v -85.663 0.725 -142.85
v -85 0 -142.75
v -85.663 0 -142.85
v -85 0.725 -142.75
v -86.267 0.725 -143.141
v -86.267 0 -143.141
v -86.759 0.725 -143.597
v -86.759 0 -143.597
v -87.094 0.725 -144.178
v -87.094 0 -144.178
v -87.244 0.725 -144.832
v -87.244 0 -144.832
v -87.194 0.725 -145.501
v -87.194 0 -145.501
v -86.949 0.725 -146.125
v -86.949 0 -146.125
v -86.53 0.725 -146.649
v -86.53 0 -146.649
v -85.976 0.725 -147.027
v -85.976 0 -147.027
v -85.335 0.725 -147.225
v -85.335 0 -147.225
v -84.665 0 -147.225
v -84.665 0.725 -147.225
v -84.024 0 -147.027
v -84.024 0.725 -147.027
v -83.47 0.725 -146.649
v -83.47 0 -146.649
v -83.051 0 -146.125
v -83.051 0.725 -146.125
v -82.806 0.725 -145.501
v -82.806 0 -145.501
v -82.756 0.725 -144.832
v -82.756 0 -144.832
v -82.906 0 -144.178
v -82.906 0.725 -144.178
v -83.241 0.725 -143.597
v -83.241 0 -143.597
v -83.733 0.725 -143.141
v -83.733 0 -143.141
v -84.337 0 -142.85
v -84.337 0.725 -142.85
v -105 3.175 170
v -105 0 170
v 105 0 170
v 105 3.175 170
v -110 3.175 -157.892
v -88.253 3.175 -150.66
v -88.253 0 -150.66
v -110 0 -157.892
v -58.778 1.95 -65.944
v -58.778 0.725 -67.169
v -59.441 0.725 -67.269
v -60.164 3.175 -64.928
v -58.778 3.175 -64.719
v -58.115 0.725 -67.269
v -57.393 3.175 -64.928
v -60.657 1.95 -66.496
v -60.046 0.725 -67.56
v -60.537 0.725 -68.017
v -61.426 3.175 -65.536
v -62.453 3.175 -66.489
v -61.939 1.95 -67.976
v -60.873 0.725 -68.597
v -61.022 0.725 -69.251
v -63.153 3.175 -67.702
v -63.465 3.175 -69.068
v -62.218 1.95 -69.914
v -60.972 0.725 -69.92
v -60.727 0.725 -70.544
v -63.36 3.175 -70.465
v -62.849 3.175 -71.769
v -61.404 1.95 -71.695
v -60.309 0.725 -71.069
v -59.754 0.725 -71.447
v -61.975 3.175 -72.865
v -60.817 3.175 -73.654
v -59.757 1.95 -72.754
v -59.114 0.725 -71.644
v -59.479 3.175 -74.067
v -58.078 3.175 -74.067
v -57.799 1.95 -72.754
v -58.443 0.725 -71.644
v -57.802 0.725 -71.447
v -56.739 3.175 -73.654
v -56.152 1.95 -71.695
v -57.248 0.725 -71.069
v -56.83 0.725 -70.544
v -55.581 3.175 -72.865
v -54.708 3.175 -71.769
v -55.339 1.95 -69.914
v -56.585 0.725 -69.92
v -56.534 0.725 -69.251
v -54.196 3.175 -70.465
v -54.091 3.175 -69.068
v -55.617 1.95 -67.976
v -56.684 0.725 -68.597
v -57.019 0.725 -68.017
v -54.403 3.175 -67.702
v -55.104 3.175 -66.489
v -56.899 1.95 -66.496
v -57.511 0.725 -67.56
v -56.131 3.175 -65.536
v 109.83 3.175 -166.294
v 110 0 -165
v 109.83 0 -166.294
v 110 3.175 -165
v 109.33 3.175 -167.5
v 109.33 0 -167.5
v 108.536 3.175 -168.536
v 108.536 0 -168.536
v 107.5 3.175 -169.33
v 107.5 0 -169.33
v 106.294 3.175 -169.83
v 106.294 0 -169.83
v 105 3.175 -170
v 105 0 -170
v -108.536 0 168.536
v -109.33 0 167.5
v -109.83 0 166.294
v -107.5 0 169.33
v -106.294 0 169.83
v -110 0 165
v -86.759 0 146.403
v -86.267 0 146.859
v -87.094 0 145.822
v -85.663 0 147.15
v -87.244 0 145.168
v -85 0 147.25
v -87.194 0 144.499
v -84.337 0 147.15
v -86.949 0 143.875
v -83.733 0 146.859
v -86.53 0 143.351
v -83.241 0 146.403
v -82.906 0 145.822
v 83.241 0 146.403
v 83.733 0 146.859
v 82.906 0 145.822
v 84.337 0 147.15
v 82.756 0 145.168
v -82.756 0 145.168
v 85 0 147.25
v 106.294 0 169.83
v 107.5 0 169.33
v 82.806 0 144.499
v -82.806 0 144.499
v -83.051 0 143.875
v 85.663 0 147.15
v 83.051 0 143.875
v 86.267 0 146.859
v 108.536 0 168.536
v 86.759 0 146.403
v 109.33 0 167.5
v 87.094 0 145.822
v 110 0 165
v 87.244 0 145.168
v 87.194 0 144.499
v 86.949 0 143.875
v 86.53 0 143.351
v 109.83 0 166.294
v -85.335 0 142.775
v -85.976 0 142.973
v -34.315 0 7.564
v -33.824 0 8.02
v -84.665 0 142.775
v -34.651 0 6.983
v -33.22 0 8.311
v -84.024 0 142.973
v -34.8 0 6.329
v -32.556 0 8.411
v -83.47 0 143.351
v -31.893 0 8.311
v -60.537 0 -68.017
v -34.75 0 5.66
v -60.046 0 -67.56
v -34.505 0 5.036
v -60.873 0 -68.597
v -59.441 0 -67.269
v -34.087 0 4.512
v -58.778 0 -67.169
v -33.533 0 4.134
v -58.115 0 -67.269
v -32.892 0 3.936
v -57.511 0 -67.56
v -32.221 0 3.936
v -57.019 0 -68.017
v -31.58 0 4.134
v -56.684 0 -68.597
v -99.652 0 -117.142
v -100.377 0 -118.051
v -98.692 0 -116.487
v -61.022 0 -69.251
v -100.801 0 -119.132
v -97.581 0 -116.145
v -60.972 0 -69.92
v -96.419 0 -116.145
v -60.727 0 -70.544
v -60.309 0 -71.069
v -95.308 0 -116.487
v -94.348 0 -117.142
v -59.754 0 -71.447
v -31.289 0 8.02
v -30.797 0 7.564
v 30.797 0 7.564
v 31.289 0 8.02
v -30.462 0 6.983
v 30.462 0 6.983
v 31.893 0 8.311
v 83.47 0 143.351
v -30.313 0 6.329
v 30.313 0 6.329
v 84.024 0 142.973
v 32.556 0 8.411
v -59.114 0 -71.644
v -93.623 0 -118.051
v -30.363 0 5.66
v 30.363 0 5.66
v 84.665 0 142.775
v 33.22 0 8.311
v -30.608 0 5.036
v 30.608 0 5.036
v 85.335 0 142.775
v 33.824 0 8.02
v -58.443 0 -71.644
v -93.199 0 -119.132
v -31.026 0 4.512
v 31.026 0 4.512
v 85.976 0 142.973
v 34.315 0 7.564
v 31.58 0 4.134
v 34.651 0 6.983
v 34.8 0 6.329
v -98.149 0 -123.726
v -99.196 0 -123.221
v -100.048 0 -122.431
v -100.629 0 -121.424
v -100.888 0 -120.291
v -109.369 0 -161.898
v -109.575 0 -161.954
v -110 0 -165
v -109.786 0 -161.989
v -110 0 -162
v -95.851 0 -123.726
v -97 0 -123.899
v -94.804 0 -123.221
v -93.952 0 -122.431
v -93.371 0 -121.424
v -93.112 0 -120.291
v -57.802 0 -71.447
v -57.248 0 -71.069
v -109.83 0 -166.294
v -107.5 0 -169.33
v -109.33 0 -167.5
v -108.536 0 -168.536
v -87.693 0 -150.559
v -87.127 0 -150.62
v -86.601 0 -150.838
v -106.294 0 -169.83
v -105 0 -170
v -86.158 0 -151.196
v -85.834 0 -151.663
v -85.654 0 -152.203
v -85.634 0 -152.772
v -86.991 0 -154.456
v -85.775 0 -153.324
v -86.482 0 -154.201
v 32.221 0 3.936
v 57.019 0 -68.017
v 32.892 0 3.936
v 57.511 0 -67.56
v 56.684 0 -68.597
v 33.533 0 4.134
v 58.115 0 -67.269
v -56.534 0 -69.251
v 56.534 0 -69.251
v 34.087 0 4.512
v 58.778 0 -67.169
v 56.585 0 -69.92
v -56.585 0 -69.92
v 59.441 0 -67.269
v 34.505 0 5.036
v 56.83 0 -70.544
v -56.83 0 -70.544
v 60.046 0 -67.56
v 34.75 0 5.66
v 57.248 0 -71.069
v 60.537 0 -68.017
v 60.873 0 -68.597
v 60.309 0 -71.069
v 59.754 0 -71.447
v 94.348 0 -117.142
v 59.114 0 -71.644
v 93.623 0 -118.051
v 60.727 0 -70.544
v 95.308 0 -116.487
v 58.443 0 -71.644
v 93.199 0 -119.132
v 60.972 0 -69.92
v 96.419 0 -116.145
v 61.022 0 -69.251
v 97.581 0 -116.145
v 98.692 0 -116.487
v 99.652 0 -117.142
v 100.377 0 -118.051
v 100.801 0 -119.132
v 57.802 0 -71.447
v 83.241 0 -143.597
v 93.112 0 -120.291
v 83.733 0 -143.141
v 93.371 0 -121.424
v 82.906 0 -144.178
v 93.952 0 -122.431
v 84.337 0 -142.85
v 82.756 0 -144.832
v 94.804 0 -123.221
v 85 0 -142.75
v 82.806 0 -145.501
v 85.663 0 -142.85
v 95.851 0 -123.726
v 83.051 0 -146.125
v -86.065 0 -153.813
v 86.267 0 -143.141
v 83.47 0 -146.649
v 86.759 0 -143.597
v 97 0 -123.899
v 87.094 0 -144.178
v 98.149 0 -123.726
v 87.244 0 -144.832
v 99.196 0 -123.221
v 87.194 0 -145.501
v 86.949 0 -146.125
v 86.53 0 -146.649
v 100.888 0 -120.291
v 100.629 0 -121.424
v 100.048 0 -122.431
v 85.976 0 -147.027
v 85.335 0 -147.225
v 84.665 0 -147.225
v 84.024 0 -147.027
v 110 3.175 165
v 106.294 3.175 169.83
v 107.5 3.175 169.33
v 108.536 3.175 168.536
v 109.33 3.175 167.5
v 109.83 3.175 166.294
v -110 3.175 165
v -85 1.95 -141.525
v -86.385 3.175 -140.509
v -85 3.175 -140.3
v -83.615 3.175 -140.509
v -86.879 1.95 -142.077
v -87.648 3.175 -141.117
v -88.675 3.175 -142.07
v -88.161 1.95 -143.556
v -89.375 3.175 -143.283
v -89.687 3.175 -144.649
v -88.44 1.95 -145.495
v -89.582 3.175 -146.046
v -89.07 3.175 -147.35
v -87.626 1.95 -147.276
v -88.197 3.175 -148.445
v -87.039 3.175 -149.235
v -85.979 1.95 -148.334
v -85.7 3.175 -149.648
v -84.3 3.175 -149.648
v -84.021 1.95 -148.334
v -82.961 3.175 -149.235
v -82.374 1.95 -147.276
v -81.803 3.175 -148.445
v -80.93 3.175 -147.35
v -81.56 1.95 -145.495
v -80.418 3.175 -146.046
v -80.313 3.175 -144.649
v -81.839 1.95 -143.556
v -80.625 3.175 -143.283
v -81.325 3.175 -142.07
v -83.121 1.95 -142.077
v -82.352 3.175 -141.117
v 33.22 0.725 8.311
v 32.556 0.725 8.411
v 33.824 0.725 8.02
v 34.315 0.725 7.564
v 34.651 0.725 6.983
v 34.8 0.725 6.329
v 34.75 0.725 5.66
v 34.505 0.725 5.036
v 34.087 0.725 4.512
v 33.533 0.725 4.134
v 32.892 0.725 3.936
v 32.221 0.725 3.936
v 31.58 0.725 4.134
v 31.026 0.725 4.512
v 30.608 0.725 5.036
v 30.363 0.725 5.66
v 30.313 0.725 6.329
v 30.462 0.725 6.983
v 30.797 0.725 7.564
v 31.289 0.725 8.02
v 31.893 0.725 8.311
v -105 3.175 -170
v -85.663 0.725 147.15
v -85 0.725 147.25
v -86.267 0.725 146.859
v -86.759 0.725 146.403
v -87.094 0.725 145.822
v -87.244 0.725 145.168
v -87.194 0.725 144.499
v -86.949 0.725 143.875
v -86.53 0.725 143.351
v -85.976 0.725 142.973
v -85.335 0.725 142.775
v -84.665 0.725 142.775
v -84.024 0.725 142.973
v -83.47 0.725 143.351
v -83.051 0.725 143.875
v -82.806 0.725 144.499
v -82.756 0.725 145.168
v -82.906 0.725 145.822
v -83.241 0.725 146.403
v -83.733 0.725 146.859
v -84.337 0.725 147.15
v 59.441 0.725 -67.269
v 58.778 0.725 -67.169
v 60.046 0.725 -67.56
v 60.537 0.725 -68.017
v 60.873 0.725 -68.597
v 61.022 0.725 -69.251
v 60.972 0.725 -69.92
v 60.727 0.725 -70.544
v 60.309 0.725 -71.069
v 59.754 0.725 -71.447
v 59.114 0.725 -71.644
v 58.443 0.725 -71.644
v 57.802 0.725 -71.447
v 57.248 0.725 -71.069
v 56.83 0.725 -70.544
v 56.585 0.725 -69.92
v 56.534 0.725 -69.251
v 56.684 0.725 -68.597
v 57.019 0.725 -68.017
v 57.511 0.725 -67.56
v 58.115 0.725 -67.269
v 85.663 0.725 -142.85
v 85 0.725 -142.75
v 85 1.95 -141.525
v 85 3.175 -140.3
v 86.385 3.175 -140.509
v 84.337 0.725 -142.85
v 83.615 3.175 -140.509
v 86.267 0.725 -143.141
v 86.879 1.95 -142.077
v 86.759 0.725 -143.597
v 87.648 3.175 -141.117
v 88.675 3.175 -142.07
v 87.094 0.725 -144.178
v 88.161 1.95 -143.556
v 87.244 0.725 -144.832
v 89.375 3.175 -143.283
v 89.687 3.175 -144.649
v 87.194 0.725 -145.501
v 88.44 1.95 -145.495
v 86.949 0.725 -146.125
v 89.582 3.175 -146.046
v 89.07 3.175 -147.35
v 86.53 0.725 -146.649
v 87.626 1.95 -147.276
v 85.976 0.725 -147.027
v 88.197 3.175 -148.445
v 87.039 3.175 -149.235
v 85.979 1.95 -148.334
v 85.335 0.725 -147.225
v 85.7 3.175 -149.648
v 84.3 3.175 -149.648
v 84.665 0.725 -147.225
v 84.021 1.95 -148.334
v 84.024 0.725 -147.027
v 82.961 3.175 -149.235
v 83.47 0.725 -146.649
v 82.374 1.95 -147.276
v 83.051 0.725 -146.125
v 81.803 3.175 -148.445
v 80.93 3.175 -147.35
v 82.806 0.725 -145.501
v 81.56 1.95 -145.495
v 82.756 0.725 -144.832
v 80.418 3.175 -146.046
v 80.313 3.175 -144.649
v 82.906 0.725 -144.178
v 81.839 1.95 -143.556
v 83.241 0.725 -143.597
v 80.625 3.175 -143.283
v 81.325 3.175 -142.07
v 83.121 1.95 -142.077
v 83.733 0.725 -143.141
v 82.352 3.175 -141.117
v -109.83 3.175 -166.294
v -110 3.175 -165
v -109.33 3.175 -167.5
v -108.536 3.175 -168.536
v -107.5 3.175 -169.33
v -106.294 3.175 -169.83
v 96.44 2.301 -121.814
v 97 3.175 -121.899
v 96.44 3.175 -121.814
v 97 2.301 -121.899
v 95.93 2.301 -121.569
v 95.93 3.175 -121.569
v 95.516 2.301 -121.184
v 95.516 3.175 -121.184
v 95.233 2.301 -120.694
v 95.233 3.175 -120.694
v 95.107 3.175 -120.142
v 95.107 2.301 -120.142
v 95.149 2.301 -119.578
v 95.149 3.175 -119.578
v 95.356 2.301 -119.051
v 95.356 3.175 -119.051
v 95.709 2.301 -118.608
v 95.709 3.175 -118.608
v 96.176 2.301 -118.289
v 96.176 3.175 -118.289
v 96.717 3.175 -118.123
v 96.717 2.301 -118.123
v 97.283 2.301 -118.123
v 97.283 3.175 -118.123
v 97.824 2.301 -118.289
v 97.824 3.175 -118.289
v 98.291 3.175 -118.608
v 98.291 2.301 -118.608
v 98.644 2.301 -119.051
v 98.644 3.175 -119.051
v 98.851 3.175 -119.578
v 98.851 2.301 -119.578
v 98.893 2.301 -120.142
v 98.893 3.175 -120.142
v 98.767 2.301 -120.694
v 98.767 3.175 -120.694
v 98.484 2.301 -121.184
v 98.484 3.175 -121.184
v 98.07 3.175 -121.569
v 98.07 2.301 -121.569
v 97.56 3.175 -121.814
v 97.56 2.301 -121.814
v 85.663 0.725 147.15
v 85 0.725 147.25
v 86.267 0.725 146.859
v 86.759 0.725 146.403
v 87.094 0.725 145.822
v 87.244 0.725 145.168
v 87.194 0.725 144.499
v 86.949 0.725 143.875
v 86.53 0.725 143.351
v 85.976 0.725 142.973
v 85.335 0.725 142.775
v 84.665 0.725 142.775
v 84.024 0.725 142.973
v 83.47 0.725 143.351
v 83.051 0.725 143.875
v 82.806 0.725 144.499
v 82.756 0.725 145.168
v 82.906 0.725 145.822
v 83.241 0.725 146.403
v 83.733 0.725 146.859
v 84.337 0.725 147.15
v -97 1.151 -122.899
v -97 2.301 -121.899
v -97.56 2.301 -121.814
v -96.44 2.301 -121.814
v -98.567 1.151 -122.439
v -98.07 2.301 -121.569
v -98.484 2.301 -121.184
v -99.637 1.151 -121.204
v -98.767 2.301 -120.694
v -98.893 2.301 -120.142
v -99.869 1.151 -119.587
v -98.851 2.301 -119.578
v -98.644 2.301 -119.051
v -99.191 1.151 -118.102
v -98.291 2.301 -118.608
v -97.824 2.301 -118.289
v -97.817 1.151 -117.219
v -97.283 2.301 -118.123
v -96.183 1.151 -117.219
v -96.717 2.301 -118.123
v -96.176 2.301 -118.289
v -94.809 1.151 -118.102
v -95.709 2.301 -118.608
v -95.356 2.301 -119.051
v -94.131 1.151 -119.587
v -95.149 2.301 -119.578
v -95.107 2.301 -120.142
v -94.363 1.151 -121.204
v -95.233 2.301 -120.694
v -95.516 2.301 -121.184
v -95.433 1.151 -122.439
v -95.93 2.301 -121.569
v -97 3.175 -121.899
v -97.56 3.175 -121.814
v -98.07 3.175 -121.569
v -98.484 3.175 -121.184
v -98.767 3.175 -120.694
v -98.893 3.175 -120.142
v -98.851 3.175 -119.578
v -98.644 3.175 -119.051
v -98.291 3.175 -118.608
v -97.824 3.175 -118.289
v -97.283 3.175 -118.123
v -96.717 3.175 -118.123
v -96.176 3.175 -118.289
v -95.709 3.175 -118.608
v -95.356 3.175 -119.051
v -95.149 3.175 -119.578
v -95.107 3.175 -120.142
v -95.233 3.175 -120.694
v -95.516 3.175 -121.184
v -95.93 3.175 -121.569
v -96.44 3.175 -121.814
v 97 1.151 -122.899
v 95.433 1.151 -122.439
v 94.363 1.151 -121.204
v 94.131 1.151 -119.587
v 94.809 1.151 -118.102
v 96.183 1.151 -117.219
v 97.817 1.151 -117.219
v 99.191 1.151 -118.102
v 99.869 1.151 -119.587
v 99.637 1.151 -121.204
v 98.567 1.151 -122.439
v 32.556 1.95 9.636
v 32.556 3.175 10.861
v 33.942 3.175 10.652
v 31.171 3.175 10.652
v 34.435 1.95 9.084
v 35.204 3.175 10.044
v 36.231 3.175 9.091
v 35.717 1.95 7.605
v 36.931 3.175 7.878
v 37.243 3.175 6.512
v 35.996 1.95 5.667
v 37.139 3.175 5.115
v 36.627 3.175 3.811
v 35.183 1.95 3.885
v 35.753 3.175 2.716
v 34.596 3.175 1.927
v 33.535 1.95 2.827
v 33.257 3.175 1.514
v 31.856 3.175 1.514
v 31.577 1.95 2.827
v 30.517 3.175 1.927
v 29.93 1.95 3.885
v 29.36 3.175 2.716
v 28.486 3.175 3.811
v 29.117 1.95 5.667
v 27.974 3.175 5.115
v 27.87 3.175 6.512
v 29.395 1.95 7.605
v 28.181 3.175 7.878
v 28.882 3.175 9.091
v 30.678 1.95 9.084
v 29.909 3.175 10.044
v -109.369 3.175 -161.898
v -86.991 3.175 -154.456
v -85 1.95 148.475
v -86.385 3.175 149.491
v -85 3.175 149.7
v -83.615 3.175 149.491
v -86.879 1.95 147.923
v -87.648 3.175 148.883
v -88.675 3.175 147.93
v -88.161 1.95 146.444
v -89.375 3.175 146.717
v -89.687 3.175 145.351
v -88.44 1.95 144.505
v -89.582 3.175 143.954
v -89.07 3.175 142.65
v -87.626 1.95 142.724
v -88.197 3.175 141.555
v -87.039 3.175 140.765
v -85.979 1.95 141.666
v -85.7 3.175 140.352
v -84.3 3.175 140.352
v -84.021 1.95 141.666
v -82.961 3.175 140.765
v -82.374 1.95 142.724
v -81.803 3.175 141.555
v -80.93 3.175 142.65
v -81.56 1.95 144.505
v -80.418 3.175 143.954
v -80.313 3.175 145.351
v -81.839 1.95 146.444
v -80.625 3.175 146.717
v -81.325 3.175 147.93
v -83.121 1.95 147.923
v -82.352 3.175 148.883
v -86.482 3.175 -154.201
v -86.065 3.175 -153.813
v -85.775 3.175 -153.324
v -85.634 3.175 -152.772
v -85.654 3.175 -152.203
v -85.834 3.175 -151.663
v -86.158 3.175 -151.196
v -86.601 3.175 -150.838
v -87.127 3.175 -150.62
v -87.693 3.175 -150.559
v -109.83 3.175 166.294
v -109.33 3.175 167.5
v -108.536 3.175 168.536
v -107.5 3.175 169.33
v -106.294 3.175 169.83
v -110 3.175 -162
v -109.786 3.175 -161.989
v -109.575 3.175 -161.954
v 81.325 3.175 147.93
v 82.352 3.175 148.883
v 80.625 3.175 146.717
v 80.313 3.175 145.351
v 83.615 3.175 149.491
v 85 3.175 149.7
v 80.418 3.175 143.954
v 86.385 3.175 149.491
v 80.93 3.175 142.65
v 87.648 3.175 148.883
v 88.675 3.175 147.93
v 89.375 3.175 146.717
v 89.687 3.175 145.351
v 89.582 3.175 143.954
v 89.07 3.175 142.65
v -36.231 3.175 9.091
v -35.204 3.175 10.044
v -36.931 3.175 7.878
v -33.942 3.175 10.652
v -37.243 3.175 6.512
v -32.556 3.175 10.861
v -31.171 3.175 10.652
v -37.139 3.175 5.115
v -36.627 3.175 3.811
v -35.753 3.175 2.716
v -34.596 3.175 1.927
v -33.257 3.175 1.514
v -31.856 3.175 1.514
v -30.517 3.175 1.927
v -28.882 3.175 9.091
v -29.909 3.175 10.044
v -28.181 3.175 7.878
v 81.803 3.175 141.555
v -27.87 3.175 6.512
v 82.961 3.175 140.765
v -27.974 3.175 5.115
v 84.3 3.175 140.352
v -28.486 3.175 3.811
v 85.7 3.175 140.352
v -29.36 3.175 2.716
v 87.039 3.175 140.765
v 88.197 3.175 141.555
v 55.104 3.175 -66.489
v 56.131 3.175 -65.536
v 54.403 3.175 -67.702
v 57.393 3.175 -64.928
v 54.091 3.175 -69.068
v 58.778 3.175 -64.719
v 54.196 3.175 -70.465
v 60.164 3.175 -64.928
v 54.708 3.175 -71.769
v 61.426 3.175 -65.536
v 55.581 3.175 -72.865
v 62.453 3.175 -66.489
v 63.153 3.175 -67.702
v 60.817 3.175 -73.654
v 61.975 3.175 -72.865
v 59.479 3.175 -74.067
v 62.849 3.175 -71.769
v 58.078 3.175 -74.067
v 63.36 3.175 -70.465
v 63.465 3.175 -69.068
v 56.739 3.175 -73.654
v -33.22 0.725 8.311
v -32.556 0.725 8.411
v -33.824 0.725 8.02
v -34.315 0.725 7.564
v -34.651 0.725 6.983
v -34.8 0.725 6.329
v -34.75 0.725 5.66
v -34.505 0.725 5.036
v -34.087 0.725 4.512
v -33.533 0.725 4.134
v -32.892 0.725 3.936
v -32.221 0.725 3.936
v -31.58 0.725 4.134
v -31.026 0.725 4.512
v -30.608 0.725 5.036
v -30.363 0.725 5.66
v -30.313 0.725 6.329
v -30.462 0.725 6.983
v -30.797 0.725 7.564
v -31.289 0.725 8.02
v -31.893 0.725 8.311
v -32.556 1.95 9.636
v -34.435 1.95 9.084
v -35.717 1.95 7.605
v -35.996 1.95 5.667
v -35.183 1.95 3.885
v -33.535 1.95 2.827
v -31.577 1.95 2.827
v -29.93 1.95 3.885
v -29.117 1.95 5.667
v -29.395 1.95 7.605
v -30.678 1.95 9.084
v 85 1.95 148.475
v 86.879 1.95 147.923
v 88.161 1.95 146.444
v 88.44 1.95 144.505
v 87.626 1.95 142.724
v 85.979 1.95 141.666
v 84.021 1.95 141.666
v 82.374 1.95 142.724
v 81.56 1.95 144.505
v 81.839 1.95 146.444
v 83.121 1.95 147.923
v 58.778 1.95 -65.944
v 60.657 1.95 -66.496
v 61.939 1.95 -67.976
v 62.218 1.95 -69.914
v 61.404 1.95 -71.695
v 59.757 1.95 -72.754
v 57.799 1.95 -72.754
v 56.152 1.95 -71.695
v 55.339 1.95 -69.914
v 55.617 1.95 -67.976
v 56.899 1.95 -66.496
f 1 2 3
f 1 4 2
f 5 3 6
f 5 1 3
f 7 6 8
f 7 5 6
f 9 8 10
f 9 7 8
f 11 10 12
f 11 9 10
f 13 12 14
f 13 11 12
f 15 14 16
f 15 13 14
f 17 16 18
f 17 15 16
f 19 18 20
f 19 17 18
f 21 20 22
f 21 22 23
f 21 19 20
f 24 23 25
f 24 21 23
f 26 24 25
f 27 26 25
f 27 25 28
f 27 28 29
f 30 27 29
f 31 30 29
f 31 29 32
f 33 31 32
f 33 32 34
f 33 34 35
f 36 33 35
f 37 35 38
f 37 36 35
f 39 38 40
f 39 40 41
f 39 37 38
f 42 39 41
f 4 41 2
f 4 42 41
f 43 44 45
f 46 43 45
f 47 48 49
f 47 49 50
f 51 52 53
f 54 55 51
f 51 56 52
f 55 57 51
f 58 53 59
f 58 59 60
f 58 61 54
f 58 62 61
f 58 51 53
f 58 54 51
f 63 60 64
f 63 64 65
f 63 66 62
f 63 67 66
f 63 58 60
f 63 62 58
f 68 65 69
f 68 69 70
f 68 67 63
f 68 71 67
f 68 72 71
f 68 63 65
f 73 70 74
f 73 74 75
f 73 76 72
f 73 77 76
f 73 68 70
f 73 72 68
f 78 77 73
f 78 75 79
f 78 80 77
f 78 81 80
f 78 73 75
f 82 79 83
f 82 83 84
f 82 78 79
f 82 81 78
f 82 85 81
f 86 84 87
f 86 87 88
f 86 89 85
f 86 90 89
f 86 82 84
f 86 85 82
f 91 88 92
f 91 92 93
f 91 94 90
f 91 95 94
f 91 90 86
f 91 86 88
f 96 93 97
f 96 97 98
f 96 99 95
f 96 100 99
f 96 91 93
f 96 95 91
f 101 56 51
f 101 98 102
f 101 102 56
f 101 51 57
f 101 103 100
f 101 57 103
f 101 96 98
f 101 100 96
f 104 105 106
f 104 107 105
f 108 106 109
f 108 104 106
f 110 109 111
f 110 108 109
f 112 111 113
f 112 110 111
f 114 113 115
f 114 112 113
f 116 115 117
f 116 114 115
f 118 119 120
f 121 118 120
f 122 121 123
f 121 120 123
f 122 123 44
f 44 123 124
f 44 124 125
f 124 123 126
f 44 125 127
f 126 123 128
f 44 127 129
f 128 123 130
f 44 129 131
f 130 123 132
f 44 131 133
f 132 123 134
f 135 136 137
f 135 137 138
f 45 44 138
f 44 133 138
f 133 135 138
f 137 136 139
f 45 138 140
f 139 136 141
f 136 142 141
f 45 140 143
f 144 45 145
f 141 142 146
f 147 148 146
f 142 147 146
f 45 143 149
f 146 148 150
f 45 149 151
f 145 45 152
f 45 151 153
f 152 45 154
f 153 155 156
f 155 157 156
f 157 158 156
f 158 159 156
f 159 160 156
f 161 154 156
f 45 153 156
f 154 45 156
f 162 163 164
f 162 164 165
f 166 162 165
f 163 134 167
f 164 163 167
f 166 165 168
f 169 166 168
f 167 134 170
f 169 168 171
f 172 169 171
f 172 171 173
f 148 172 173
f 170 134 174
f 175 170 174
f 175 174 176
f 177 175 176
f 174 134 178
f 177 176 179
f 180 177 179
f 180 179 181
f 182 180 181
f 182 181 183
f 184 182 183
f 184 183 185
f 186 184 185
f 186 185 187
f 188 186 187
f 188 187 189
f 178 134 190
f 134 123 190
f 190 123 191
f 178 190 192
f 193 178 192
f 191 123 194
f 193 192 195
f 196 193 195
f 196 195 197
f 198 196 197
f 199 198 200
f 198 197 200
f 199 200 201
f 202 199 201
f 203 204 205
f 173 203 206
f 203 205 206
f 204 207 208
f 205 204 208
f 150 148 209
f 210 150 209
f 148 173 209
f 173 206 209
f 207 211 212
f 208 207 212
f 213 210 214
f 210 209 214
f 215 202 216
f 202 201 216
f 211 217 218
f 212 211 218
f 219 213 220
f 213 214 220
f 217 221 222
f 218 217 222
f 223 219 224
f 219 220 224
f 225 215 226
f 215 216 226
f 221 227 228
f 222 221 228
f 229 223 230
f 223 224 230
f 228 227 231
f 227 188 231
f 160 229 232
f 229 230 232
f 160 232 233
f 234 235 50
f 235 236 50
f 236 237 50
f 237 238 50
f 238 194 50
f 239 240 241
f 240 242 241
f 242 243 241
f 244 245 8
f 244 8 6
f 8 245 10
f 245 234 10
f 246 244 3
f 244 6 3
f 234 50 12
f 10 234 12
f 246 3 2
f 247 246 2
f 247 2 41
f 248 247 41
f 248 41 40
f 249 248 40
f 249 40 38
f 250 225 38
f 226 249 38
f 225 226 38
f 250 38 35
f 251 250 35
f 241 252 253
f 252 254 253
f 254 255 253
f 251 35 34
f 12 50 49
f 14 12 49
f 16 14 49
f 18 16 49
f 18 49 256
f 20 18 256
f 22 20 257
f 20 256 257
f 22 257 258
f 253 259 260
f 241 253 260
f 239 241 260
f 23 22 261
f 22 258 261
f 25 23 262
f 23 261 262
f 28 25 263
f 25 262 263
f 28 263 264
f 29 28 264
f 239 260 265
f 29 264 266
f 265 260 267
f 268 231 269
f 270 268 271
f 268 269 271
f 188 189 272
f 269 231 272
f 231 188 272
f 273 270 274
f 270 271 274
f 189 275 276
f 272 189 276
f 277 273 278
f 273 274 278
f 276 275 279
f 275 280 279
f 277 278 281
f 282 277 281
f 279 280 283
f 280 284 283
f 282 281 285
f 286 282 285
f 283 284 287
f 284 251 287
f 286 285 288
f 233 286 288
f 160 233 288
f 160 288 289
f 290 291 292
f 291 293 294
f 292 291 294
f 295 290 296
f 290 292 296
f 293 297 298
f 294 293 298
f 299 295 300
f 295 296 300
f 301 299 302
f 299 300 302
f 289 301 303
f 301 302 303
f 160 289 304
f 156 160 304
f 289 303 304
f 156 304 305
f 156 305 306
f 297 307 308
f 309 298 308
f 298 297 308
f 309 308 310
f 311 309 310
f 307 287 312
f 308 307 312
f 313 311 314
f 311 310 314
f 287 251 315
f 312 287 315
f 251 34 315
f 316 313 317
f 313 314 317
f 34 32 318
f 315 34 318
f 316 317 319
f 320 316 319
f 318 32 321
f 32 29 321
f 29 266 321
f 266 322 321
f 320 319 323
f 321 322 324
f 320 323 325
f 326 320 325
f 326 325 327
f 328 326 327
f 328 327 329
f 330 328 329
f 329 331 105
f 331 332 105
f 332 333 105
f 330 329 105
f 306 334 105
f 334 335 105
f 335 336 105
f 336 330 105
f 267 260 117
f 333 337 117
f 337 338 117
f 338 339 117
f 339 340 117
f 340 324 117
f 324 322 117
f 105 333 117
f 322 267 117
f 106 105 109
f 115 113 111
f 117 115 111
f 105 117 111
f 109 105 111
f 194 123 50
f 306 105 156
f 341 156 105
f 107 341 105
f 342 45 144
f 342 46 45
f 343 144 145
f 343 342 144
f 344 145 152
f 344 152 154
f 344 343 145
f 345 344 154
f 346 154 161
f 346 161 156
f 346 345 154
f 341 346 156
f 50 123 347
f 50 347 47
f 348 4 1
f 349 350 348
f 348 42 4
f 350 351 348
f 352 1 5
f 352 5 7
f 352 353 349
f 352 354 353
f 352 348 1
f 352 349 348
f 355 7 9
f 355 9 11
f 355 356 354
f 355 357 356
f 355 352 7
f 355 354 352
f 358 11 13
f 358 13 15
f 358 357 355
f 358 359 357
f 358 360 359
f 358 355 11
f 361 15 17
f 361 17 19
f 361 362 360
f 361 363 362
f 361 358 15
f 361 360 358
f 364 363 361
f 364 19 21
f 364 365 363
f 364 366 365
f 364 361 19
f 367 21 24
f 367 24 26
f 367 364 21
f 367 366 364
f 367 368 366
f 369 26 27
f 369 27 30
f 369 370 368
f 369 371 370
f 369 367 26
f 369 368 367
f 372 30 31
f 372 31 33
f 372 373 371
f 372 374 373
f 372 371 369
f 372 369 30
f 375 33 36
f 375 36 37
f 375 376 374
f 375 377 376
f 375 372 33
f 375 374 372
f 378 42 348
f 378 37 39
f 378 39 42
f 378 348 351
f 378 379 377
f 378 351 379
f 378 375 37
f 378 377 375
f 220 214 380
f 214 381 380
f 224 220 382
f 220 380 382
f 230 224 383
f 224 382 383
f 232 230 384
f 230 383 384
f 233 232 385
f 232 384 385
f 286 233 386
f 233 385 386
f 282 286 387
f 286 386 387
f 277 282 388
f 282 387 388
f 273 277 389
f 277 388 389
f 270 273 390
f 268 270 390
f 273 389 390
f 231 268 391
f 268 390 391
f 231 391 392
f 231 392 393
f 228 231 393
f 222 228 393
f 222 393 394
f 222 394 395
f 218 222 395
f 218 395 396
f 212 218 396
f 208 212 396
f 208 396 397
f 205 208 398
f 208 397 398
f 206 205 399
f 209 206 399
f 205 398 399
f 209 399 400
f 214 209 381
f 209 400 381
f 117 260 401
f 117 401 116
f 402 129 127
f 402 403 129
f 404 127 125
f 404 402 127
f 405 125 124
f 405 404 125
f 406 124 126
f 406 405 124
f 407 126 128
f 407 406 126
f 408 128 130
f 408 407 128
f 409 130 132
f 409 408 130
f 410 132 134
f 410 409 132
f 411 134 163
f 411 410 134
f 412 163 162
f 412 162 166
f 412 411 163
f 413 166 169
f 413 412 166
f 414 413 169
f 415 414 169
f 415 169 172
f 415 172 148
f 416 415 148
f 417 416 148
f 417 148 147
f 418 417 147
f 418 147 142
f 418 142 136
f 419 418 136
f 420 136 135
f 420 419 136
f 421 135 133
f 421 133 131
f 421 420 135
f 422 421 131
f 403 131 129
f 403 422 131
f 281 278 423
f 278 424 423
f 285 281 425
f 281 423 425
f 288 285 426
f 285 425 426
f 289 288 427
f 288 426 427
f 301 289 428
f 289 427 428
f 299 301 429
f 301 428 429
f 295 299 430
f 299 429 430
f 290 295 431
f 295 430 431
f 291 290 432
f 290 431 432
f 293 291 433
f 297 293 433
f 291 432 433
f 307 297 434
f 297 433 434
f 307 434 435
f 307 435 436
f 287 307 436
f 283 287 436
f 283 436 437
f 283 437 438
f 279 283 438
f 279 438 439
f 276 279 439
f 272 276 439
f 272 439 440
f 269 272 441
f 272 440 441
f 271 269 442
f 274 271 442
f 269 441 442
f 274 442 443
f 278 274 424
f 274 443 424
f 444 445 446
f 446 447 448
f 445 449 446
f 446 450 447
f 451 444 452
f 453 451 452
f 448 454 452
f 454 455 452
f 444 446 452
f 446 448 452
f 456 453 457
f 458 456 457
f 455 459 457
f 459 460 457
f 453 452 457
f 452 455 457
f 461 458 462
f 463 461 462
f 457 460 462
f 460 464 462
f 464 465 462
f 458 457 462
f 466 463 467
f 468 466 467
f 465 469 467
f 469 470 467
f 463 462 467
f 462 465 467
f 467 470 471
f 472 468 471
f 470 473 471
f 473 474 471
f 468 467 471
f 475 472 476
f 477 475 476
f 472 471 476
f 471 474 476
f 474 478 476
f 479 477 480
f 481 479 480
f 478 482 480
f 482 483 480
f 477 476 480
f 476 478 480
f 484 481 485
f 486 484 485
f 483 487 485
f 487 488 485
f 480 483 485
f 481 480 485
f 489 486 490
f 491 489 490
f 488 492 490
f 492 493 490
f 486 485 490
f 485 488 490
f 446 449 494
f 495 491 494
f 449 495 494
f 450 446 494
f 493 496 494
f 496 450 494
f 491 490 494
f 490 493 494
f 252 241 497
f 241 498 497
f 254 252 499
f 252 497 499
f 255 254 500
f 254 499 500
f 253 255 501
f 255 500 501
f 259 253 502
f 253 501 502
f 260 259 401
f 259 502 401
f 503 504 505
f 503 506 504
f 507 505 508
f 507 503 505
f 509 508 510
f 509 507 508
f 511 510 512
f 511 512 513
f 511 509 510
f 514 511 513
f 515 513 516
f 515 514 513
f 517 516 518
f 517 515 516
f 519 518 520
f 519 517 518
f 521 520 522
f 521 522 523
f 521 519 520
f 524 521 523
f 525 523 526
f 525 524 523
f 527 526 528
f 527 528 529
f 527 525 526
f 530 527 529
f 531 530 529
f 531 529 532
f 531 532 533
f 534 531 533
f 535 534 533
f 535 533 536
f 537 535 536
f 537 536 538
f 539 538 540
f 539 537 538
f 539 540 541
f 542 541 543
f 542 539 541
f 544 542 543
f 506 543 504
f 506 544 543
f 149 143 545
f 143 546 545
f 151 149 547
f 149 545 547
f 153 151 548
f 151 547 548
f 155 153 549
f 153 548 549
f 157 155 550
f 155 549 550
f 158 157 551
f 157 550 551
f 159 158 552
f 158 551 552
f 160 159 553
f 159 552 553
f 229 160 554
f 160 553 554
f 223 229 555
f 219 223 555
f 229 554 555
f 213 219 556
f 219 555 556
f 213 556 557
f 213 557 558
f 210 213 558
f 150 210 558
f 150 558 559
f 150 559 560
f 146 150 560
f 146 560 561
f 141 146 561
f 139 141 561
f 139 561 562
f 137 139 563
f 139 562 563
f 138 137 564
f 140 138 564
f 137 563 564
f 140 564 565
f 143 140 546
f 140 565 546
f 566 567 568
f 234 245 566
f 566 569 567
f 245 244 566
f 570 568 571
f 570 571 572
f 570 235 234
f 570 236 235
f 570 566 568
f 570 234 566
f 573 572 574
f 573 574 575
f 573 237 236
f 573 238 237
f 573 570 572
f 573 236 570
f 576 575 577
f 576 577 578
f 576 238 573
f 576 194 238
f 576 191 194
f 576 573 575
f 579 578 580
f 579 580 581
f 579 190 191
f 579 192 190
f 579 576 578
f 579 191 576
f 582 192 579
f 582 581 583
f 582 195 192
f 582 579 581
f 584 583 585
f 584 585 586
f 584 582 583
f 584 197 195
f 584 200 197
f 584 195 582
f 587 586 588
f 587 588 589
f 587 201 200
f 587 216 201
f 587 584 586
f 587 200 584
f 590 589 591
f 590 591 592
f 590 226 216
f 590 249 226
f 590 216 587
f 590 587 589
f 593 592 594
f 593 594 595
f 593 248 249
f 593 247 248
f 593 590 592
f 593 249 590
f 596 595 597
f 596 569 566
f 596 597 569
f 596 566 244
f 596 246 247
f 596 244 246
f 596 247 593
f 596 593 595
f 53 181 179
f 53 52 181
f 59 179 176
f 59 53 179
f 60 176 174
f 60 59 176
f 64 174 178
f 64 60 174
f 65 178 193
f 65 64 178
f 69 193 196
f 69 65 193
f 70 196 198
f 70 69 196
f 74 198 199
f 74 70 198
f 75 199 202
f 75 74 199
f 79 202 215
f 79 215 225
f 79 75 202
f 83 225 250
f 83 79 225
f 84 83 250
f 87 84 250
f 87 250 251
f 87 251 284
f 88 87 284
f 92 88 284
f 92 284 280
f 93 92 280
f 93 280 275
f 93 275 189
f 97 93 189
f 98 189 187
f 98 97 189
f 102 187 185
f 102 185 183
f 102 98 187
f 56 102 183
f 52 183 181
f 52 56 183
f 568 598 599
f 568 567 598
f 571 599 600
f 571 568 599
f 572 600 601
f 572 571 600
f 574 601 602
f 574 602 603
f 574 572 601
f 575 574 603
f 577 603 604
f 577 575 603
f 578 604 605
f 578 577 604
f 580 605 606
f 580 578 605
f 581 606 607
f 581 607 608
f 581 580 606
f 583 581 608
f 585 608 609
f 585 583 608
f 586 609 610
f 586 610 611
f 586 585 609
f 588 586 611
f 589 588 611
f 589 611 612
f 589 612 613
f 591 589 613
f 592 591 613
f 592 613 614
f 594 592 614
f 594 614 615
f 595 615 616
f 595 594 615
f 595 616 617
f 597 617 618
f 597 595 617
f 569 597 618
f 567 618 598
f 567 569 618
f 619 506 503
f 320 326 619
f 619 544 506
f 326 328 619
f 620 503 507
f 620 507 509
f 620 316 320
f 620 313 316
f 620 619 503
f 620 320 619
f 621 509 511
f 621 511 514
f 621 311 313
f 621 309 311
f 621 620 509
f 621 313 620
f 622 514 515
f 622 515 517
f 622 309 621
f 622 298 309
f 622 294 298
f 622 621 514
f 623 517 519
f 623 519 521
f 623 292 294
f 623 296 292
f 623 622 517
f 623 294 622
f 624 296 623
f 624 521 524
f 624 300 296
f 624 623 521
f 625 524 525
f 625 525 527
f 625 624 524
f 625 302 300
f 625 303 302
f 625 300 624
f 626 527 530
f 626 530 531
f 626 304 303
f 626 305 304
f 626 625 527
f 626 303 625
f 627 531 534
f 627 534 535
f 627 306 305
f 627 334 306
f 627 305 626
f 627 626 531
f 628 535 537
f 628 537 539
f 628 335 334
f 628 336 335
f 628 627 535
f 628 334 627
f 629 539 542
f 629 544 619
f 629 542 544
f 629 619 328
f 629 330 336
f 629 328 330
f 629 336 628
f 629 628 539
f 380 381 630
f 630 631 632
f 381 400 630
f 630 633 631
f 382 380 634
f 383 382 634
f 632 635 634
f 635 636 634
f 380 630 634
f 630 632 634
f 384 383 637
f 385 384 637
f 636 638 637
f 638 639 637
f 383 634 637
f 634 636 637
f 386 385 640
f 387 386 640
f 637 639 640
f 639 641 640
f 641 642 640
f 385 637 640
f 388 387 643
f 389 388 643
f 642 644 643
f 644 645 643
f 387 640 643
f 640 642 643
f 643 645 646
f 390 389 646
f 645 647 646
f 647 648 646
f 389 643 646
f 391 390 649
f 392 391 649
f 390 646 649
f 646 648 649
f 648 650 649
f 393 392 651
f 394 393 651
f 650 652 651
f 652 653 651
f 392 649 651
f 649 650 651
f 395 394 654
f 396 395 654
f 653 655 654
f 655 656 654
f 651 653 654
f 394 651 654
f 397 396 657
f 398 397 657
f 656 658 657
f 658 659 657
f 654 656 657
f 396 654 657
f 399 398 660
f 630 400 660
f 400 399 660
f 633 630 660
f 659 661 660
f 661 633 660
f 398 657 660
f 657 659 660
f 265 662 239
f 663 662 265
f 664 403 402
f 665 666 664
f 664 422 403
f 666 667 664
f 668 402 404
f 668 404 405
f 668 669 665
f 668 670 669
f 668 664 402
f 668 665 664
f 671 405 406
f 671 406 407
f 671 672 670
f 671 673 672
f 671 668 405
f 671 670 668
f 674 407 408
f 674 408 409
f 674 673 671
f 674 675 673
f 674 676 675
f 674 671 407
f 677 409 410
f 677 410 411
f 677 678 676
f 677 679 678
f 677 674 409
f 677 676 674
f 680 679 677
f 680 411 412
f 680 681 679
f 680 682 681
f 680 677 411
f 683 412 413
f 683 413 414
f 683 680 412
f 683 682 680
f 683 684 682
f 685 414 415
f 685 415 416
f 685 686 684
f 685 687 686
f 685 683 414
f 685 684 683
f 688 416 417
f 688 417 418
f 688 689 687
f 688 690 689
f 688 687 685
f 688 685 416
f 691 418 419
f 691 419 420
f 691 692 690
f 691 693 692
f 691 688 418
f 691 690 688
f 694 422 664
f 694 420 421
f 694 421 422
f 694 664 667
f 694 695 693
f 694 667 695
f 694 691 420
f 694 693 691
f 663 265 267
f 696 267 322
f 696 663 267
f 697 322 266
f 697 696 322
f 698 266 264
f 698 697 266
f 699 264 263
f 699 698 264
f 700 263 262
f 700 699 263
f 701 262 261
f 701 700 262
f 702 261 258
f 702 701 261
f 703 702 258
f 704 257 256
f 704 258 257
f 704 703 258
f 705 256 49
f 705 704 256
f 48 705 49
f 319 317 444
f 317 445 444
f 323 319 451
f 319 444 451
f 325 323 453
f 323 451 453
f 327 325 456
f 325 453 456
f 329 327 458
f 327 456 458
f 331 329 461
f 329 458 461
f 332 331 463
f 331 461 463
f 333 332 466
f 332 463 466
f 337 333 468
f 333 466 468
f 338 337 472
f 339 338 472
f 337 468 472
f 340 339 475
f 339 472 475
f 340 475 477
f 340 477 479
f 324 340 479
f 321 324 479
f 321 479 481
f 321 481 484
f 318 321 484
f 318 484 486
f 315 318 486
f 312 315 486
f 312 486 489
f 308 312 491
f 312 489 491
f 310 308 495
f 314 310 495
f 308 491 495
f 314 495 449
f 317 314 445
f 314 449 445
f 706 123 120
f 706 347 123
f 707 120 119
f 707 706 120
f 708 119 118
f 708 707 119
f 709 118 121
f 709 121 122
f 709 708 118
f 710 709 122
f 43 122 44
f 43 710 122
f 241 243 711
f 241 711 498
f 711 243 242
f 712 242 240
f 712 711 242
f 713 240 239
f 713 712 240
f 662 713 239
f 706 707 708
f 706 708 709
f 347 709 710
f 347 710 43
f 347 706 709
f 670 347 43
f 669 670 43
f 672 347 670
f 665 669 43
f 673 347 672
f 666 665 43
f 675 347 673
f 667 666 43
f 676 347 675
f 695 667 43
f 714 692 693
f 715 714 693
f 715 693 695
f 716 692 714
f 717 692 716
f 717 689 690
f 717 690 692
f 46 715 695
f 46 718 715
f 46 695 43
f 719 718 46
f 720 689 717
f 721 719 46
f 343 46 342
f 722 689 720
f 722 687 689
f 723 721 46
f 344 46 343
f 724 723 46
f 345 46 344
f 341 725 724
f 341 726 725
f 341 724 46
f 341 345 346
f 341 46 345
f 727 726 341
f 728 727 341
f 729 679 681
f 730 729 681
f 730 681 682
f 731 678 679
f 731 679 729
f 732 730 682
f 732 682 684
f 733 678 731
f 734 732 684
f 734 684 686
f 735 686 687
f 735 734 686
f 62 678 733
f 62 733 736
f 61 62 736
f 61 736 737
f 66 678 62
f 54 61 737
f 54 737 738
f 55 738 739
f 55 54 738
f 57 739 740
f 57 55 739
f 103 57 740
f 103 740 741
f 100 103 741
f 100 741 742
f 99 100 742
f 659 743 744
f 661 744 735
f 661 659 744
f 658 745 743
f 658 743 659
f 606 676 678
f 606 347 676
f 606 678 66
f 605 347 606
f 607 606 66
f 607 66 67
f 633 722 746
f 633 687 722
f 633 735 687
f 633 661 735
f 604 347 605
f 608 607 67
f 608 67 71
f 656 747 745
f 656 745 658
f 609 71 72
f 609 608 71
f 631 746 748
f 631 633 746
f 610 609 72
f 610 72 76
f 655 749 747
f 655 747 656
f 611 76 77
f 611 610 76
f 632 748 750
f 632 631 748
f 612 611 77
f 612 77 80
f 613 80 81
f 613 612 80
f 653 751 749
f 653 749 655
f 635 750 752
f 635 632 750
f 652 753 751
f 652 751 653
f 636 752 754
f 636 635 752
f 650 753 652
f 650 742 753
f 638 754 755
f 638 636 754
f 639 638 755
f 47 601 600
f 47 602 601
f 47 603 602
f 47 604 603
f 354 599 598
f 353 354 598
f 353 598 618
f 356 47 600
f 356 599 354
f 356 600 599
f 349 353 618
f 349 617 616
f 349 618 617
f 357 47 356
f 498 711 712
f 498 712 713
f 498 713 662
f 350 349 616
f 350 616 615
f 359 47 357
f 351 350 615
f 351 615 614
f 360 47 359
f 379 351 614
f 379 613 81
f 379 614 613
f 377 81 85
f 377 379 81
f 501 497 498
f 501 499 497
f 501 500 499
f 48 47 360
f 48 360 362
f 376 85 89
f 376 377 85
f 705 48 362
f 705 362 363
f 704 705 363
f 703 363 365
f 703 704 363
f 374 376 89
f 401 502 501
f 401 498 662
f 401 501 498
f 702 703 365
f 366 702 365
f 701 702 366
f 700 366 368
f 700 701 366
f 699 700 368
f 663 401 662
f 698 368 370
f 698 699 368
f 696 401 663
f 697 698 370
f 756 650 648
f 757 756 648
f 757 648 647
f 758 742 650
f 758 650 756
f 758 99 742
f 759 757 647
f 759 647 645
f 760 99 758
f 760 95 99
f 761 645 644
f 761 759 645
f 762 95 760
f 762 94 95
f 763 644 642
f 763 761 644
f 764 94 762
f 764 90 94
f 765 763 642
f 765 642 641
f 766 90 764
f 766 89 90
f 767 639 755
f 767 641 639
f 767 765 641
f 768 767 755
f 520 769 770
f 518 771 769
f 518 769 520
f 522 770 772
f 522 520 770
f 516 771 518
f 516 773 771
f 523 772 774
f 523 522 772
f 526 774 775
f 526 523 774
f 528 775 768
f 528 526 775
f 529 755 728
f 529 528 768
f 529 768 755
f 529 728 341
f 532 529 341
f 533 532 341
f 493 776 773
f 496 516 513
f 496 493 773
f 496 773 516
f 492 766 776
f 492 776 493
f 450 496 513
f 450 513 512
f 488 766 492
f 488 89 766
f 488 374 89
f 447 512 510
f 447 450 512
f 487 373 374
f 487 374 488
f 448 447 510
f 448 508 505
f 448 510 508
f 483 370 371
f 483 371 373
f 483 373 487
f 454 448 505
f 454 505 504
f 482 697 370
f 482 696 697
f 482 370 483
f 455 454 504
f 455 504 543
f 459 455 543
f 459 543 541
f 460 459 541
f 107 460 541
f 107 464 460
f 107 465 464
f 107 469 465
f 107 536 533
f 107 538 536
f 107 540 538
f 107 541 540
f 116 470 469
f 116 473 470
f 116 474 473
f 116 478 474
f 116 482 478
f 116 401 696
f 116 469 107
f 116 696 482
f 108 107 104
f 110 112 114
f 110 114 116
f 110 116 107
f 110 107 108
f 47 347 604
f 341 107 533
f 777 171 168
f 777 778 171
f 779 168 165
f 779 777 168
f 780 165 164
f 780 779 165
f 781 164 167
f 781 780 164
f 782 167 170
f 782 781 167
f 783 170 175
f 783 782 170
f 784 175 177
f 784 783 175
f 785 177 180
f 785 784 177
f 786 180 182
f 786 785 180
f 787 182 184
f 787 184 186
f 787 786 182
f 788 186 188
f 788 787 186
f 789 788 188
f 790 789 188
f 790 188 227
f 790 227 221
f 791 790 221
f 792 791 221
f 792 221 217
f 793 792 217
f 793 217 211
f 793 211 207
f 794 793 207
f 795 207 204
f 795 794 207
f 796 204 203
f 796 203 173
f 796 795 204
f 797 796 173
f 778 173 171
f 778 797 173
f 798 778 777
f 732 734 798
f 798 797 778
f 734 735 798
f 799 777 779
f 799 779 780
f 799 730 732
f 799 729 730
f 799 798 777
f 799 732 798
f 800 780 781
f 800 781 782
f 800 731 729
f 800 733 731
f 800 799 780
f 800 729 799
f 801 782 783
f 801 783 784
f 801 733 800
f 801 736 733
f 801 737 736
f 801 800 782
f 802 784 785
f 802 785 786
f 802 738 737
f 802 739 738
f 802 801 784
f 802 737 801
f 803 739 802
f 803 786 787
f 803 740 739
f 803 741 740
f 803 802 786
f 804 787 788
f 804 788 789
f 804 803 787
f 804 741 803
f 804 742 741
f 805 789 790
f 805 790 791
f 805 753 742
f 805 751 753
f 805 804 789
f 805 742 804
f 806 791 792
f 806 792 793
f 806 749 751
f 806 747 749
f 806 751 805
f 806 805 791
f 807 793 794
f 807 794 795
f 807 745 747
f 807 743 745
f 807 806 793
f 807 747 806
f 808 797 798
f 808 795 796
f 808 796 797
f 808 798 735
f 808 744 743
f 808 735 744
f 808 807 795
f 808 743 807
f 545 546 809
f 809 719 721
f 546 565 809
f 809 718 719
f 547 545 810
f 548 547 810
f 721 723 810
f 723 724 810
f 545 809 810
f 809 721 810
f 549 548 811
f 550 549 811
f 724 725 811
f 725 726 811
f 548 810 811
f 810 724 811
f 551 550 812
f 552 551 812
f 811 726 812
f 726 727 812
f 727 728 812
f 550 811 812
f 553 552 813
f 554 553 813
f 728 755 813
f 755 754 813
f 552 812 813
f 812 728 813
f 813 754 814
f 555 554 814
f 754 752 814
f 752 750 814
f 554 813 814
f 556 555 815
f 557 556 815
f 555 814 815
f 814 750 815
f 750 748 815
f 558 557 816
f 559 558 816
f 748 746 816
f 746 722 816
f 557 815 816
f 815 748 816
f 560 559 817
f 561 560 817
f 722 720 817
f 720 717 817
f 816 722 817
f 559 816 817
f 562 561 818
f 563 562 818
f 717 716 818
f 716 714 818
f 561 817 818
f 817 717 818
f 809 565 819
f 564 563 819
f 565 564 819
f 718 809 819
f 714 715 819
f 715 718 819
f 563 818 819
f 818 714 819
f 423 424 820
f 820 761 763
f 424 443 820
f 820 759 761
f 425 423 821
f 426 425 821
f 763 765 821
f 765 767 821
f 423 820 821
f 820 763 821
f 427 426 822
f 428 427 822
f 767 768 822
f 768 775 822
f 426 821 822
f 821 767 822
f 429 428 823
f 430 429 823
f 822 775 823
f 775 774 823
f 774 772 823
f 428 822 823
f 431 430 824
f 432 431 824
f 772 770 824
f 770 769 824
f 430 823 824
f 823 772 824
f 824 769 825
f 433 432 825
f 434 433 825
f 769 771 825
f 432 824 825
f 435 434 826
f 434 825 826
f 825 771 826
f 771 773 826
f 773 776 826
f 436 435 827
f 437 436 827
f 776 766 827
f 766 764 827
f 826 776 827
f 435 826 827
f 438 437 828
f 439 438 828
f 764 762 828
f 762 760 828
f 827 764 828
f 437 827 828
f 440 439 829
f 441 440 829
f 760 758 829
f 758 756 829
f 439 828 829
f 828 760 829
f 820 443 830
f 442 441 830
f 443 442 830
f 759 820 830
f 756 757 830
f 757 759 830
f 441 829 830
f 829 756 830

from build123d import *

# Parameters (mm, degrees)
SKETCH1_W                                      = 220
SKETCH1_H                                      = 340
BOSS_EXTRUDE1_DEPTH                            = 3.175
FILLET1_R                                      = 5
CSK_FOR_6_FLAT_HEAD_SOCKET_CAP_SCREW1_A_COUNT  = 2
CSK_FOR_6_FLAT_HEAD_SOCKET_CAP_SCREW1_A_PITCH  = 194
CSK_FOR_M4_FLAT_HEAD_MACHINE_SCREW1_AT_2_COUNT = 2
CSK_FOR_M4_FLAT_HEAD_MACHINE_SCREW1_AT_2_PITCH = 148.413565465
CSK_FOR_M4_FLAT_HEAD_MACHINE_SCREW1_AT_3_COUNT = 2
CSK_FOR_M4_FLAT_HEAD_MACHINE_SCREW1_AT_3_PITCH = 216.016881764
CSK_FOR_M4_FLAT_HEAD_MACHINE_SCREW1_AT_4_COUNT = 2
CSK_FOR_M4_FLAT_HEAD_MACHINE_SCREW1_AT_4_PITCH = 290
CUT_EXTRUDE1_DEPTH                             = 4.175


with BuildPart() as part:
    # Sketch1 → Boss-Extrude1 (new body)
    with BuildSketch(Plane(origin=(0, 0, 0), x_dir=(1, 0, 0), z_dir=(0, 1, 0))):
        Rectangle(SKETCH1_W, SKETCH1_H)
    extrude(amount=BOSS_EXTRUDE1_DEPTH)

    # Fillet1
    fillet1_edges = [part.edges().sort_by_distance(p)[0] for p in [
        (-110, 1.5875, -170),
        (110, 1.5875, -170),
        (110, 1.5875, 170),
        (-110, 1.5875, 170),
    ]]
    fillet(fillet1_edges, radius=FILLET1_R)

    # Sketch4 → CSK for #6 Flat Head Socket Cap Screw1 (revolve, cut)
    with BuildSketch(Plane(origin=(97, 0, -120), x_dir=(0, 0, -1), z_dir=(1, 0, 0))):
        Polygon((0, 0), (0, 3.175), (1.89865, 3.175), (1.89865, 2.301024407), (3.8989, 0), align=None)
    csk_for_6_flat_head_socket_cap_screw1 = revolve(axis=Axis((97, -6.35, -120), (0, 1, 0)), mode=Mode.SUBTRACT)

    # CSK for #6 Flat Head Socket Cap Screw1 a: CSK for #6 Flat Head Socket Cap Screw1 ×2
    with Locations(*[(-i * CSK_FOR_6_FLAT_HEAD_SOCKET_CAP_SCREW1_A_PITCH, 0, 0) for i in range(1, CSK_FOR_6_FLAT_HEAD_SOCKET_CAP_SCREW1_A_COUNT)]):
        add(csk_for_6_flat_head_socket_cap_screw1, mode=Mode.SUBTRACT)

    # Sketch5 → CSK for M4 Flat Head Machine Screw1 (revolve, cut)
    with BuildSketch(Plane(origin=(-85, 3.175, 145), x_dir=(0, 0, 1), z_dir=(1, 0, 0))):
        Polygon((0, 0), (0, 3.175), (2.25, 3.175), (2.25, 2.45), (4.7, 0), align=None)
    csk_for_m4_flat_head_machine_screw1 = revolve(axis=Axis((-85, 9.525, 145), (0, -1, 0)), mode=Mode.SUBTRACT)

    # CSK for M4 Flat Head Machine Screw1 at 2: CSK for M4 Flat Head Machine Screw1 ×2
    with Locations(*[Vector(0.353361448, 0, -0.935486872) * (i * CSK_FOR_M4_FLAT_HEAD_MACHINE_SCREW1_AT_2_PITCH) for i in range(1, CSK_FOR_M4_FLAT_HEAD_MACHINE_SCREW1_AT_2_COUNT)]):
        add(csk_for_m4_flat_head_machine_screw1, mode=Mode.SUBTRACT)

    # CSK for M4 Flat Head Machine Screw1 at 3: CSK for M4 Flat Head Machine Screw1 ×2
    with Locations(*[Vector(0.12138781, 0, -0.992605158) * (i * CSK_FOR_M4_FLAT_HEAD_MACHINE_SCREW1_AT_3_PITCH) for i in range(1, CSK_FOR_M4_FLAT_HEAD_MACHINE_SCREW1_AT_3_COUNT)]):
        add(csk_for_m4_flat_head_machine_screw1, mode=Mode.SUBTRACT)

    # CSK for M4 Flat Head Machine Screw1 at 4: CSK for M4 Flat Head Machine Screw1 ×2
    with Locations(*[(0, 0, -i * CSK_FOR_M4_FLAT_HEAD_MACHINE_SCREW1_AT_4_PITCH) for i in range(1, CSK_FOR_M4_FLAT_HEAD_MACHINE_SCREW1_AT_4_COUNT)]):
        add(csk_for_m4_flat_head_machine_screw1, mode=Mode.SUBTRACT)

    # Mirror1: CSK for M4 Flat Head Machine Screw1 across plane
    add(csk_for_m4_flat_head_machine_screw1.mirror(Plane(origin=(0, 0, 0), x_dir=(0, 0, 1), z_dir=(1, 0, 0))), mode=Mode.SUBTRACT)

    # Mirror1 copy 1 sketch → Mirror1 copy 1 (revolve, cut)
    with BuildSketch(Plane(origin=(32.556367665, 3.175, 6.161057907), x_dir=(0, 0, 1), z_dir=(-1, 0, 0))):
        Polygon((0, 0), (0, -3.175), (2.25, -3.175), (2.25, -2.45), (4.7, 0), align=None)
    revolve(axis=Axis((32.556367665, 9.525, 6.161057907), (0, 1, 0)), mode=Mode.SUBTRACT)

    # Mirror1 copy 2 sketch → Mirror1 copy 2 (revolve, cut)
    with BuildSketch(Plane(origin=(58.778183832, 3.175, -69.419471047), x_dir=(0, 0, 1), z_dir=(-1, 0, 0))):
        Polygon((0, 0), (0, -3.175), (2.25, -3.175), (2.25, -2.45), (4.7, 0), align=None)
    revolve(axis=Axis((58.778183832, 9.525, -69.419471047), (0, 1, 0)), mode=Mode.SUBTRACT)

    # Mirror1 copy 3 sketch → Mirror1 copy 3 (revolve, cut)
    with BuildSketch(Plane(origin=(85, 3.175, -145), x_dir=(0, 0, 1), z_dir=(-1, 0, 0))):
        Polygon((0, 0), (0, -3.175), (2.25, -3.175), (2.25, -2.45), (4.7, 0), align=None)
    revolve(axis=Axis((85, 9.525, -145), (0, 1, 0)), mode=Mode.SUBTRACT)

    # Sketch7 → Cut-Extrude1 (cut, through all)
    with BuildSketch(Plane(origin=(0, 3.175, 0), x_dir=(1, 0, 0), z_dir=(0, 1, 0))):
        with BuildLine():
            Line((-109.368867035, 161.89780694), (-86.991048652, 154.455859835))
            ThreePointArc((-86.991048652, 154.455859835), (-85.724374677, 151.926919931), (-88.253314582, 150.660245956))
            Line((-88.253314582, 150.660245956), (-110.631132965, 158.10219306))
            ThreePointArc((-110.631132965, 158.10219306), (-111.89780694, 160.631132965), (-109.368867035, 161.89780694))
        make_face()
    extrude(amount=-CUT_EXTRUDE1_DEPTH, mode=Mode.SUBTRACT)


solid = part.part
